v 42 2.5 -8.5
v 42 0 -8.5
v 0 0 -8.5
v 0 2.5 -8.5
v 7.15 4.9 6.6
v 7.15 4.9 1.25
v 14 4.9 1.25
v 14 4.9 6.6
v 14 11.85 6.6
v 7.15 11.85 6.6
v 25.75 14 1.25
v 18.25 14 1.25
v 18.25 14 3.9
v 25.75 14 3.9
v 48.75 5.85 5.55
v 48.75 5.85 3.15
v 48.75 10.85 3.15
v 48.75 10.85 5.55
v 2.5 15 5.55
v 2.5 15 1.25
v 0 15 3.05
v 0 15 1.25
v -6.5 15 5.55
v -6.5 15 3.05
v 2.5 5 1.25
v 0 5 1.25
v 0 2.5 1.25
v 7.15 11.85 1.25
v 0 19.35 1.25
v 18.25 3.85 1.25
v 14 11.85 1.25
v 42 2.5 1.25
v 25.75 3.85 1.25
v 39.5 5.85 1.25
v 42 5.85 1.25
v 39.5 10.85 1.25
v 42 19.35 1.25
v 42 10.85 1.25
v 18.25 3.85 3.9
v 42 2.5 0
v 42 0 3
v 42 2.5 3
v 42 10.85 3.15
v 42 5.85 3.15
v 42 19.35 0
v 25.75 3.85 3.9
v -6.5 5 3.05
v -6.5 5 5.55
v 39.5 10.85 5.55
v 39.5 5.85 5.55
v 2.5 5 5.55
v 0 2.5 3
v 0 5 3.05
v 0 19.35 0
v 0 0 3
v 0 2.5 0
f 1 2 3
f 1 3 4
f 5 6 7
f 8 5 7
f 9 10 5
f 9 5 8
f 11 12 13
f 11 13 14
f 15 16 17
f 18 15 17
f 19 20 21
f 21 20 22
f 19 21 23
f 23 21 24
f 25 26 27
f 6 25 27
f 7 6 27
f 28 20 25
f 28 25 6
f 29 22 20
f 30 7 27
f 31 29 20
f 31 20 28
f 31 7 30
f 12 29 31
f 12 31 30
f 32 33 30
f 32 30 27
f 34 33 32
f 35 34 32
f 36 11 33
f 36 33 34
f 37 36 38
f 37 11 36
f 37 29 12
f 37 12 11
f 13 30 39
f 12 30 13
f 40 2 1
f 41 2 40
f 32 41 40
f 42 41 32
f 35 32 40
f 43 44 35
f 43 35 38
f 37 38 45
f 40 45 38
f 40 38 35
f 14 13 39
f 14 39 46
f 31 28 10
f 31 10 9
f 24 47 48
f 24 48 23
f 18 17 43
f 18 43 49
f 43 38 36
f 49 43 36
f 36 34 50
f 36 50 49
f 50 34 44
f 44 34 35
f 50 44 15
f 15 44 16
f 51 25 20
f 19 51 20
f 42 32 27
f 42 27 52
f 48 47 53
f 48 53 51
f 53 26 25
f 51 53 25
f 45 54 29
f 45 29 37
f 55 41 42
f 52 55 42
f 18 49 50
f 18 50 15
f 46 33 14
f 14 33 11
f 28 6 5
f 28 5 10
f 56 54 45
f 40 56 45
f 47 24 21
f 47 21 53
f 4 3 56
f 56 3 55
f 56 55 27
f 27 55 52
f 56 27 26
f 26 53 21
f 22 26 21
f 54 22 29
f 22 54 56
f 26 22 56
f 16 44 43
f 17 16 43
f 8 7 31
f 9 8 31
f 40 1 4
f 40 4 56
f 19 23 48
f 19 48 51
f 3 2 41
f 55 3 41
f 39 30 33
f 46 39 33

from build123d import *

# Parameters (mm, degrees)
F0_W      = 42
F0_H      = 19.35
F1_DEPTH  = 1.25
F2_W      = 2.5
F2_H      = 8.5
F2_H_2    = 1.75
F3_DEPTH  = 42
F4_W      = 2.5
F4_H      = 5
F4_W_2    = 6.75
F4_W_3    = 6.5
F4_H_2    = 10
F5_DEPTH  = 4.3
F6_W      = 5
F6_H      = 1.9
F7_DEPTH  = 6.75
F8_W      = 10
F8_H      = 1.8
F9_DEPTH  = 6.5
F4_W_4    = 6.85
F4_H_3    = 6.95
F10_DEPTH = 5.35
F4_W_5    = 7.5
F4_H_4    = 10.15
F11_DEPTH = 2.65


with BuildPart() as f1:
    # F0 (on Top) → F1 (new body)
    with BuildSketch(Plane.XY):
        with Locations((21, 9.675)):
            Rectangle(F0_W, F0_H)
    extrude(amount=F1_DEPTH)

    # F2 (on face) → F3 (join)
    with BuildSketch(Plane.YZ.offset(42)):
        with Locations((1.25, -4.25)):
            Rectangle(F2_W, F2_H)
        with Locations((1.25, 2.125)):
            Rectangle(F2_W, F2_H_2)
    extrude(amount=-F3_DEPTH)

    # F4 (on face) → F5 (join)
    with BuildSketch(Plane.XY.offset(1.25)):
        with Locations((40.75, 8.35)):
            Rectangle(F4_W, F4_H)
        with Locations((45.375, 8.35)):
            Rectangle(F4_W_2, F4_H)
        with Locations((-3.25, 10)):
            Rectangle(F4_W_3, F4_H_2)
        with Locations((1.25, 10)):
            Rectangle(F4_W, F4_H_2)
    extrude(amount=F5_DEPTH)

    # F6 (on face) → F7 (cut)
    with BuildSketch(Plane.YZ.offset(48.75)):
        with Locations((8.35, 2.2)):
            Rectangle(F6_W, F6_H)
    extrude(amount=-F7_DEPTH, mode=Mode.SUBTRACT)

    # F8 (on face) → F9 (cut)
    with BuildSketch(Plane(origin=(-6.5, 0, 0), x_dir=(0, -1, 0), z_dir=(-1, 0, 0))):
        with Locations((-10, 2.15)):
            Rectangle(F8_W, F8_H)
    extrude(amount=-F9_DEPTH, mode=Mode.SUBTRACT)

    # F4 (on face) → F10 (join)
    with BuildSketch(Plane.XY.offset(1.25)):
        with Locations((10.575, 8.375)):
            Rectangle(F4_W_4, F4_H_3)
    extrude(amount=F10_DEPTH)

    # F4 (on face) → F11 (join)
    with BuildSketch(Plane.XY.offset(1.25)):
        with Locations((22, 8.925)):
            Rectangle(F4_W_5, F4_H_4)
    extrude(amount=F11_DEPTH)


solid = f1.part
